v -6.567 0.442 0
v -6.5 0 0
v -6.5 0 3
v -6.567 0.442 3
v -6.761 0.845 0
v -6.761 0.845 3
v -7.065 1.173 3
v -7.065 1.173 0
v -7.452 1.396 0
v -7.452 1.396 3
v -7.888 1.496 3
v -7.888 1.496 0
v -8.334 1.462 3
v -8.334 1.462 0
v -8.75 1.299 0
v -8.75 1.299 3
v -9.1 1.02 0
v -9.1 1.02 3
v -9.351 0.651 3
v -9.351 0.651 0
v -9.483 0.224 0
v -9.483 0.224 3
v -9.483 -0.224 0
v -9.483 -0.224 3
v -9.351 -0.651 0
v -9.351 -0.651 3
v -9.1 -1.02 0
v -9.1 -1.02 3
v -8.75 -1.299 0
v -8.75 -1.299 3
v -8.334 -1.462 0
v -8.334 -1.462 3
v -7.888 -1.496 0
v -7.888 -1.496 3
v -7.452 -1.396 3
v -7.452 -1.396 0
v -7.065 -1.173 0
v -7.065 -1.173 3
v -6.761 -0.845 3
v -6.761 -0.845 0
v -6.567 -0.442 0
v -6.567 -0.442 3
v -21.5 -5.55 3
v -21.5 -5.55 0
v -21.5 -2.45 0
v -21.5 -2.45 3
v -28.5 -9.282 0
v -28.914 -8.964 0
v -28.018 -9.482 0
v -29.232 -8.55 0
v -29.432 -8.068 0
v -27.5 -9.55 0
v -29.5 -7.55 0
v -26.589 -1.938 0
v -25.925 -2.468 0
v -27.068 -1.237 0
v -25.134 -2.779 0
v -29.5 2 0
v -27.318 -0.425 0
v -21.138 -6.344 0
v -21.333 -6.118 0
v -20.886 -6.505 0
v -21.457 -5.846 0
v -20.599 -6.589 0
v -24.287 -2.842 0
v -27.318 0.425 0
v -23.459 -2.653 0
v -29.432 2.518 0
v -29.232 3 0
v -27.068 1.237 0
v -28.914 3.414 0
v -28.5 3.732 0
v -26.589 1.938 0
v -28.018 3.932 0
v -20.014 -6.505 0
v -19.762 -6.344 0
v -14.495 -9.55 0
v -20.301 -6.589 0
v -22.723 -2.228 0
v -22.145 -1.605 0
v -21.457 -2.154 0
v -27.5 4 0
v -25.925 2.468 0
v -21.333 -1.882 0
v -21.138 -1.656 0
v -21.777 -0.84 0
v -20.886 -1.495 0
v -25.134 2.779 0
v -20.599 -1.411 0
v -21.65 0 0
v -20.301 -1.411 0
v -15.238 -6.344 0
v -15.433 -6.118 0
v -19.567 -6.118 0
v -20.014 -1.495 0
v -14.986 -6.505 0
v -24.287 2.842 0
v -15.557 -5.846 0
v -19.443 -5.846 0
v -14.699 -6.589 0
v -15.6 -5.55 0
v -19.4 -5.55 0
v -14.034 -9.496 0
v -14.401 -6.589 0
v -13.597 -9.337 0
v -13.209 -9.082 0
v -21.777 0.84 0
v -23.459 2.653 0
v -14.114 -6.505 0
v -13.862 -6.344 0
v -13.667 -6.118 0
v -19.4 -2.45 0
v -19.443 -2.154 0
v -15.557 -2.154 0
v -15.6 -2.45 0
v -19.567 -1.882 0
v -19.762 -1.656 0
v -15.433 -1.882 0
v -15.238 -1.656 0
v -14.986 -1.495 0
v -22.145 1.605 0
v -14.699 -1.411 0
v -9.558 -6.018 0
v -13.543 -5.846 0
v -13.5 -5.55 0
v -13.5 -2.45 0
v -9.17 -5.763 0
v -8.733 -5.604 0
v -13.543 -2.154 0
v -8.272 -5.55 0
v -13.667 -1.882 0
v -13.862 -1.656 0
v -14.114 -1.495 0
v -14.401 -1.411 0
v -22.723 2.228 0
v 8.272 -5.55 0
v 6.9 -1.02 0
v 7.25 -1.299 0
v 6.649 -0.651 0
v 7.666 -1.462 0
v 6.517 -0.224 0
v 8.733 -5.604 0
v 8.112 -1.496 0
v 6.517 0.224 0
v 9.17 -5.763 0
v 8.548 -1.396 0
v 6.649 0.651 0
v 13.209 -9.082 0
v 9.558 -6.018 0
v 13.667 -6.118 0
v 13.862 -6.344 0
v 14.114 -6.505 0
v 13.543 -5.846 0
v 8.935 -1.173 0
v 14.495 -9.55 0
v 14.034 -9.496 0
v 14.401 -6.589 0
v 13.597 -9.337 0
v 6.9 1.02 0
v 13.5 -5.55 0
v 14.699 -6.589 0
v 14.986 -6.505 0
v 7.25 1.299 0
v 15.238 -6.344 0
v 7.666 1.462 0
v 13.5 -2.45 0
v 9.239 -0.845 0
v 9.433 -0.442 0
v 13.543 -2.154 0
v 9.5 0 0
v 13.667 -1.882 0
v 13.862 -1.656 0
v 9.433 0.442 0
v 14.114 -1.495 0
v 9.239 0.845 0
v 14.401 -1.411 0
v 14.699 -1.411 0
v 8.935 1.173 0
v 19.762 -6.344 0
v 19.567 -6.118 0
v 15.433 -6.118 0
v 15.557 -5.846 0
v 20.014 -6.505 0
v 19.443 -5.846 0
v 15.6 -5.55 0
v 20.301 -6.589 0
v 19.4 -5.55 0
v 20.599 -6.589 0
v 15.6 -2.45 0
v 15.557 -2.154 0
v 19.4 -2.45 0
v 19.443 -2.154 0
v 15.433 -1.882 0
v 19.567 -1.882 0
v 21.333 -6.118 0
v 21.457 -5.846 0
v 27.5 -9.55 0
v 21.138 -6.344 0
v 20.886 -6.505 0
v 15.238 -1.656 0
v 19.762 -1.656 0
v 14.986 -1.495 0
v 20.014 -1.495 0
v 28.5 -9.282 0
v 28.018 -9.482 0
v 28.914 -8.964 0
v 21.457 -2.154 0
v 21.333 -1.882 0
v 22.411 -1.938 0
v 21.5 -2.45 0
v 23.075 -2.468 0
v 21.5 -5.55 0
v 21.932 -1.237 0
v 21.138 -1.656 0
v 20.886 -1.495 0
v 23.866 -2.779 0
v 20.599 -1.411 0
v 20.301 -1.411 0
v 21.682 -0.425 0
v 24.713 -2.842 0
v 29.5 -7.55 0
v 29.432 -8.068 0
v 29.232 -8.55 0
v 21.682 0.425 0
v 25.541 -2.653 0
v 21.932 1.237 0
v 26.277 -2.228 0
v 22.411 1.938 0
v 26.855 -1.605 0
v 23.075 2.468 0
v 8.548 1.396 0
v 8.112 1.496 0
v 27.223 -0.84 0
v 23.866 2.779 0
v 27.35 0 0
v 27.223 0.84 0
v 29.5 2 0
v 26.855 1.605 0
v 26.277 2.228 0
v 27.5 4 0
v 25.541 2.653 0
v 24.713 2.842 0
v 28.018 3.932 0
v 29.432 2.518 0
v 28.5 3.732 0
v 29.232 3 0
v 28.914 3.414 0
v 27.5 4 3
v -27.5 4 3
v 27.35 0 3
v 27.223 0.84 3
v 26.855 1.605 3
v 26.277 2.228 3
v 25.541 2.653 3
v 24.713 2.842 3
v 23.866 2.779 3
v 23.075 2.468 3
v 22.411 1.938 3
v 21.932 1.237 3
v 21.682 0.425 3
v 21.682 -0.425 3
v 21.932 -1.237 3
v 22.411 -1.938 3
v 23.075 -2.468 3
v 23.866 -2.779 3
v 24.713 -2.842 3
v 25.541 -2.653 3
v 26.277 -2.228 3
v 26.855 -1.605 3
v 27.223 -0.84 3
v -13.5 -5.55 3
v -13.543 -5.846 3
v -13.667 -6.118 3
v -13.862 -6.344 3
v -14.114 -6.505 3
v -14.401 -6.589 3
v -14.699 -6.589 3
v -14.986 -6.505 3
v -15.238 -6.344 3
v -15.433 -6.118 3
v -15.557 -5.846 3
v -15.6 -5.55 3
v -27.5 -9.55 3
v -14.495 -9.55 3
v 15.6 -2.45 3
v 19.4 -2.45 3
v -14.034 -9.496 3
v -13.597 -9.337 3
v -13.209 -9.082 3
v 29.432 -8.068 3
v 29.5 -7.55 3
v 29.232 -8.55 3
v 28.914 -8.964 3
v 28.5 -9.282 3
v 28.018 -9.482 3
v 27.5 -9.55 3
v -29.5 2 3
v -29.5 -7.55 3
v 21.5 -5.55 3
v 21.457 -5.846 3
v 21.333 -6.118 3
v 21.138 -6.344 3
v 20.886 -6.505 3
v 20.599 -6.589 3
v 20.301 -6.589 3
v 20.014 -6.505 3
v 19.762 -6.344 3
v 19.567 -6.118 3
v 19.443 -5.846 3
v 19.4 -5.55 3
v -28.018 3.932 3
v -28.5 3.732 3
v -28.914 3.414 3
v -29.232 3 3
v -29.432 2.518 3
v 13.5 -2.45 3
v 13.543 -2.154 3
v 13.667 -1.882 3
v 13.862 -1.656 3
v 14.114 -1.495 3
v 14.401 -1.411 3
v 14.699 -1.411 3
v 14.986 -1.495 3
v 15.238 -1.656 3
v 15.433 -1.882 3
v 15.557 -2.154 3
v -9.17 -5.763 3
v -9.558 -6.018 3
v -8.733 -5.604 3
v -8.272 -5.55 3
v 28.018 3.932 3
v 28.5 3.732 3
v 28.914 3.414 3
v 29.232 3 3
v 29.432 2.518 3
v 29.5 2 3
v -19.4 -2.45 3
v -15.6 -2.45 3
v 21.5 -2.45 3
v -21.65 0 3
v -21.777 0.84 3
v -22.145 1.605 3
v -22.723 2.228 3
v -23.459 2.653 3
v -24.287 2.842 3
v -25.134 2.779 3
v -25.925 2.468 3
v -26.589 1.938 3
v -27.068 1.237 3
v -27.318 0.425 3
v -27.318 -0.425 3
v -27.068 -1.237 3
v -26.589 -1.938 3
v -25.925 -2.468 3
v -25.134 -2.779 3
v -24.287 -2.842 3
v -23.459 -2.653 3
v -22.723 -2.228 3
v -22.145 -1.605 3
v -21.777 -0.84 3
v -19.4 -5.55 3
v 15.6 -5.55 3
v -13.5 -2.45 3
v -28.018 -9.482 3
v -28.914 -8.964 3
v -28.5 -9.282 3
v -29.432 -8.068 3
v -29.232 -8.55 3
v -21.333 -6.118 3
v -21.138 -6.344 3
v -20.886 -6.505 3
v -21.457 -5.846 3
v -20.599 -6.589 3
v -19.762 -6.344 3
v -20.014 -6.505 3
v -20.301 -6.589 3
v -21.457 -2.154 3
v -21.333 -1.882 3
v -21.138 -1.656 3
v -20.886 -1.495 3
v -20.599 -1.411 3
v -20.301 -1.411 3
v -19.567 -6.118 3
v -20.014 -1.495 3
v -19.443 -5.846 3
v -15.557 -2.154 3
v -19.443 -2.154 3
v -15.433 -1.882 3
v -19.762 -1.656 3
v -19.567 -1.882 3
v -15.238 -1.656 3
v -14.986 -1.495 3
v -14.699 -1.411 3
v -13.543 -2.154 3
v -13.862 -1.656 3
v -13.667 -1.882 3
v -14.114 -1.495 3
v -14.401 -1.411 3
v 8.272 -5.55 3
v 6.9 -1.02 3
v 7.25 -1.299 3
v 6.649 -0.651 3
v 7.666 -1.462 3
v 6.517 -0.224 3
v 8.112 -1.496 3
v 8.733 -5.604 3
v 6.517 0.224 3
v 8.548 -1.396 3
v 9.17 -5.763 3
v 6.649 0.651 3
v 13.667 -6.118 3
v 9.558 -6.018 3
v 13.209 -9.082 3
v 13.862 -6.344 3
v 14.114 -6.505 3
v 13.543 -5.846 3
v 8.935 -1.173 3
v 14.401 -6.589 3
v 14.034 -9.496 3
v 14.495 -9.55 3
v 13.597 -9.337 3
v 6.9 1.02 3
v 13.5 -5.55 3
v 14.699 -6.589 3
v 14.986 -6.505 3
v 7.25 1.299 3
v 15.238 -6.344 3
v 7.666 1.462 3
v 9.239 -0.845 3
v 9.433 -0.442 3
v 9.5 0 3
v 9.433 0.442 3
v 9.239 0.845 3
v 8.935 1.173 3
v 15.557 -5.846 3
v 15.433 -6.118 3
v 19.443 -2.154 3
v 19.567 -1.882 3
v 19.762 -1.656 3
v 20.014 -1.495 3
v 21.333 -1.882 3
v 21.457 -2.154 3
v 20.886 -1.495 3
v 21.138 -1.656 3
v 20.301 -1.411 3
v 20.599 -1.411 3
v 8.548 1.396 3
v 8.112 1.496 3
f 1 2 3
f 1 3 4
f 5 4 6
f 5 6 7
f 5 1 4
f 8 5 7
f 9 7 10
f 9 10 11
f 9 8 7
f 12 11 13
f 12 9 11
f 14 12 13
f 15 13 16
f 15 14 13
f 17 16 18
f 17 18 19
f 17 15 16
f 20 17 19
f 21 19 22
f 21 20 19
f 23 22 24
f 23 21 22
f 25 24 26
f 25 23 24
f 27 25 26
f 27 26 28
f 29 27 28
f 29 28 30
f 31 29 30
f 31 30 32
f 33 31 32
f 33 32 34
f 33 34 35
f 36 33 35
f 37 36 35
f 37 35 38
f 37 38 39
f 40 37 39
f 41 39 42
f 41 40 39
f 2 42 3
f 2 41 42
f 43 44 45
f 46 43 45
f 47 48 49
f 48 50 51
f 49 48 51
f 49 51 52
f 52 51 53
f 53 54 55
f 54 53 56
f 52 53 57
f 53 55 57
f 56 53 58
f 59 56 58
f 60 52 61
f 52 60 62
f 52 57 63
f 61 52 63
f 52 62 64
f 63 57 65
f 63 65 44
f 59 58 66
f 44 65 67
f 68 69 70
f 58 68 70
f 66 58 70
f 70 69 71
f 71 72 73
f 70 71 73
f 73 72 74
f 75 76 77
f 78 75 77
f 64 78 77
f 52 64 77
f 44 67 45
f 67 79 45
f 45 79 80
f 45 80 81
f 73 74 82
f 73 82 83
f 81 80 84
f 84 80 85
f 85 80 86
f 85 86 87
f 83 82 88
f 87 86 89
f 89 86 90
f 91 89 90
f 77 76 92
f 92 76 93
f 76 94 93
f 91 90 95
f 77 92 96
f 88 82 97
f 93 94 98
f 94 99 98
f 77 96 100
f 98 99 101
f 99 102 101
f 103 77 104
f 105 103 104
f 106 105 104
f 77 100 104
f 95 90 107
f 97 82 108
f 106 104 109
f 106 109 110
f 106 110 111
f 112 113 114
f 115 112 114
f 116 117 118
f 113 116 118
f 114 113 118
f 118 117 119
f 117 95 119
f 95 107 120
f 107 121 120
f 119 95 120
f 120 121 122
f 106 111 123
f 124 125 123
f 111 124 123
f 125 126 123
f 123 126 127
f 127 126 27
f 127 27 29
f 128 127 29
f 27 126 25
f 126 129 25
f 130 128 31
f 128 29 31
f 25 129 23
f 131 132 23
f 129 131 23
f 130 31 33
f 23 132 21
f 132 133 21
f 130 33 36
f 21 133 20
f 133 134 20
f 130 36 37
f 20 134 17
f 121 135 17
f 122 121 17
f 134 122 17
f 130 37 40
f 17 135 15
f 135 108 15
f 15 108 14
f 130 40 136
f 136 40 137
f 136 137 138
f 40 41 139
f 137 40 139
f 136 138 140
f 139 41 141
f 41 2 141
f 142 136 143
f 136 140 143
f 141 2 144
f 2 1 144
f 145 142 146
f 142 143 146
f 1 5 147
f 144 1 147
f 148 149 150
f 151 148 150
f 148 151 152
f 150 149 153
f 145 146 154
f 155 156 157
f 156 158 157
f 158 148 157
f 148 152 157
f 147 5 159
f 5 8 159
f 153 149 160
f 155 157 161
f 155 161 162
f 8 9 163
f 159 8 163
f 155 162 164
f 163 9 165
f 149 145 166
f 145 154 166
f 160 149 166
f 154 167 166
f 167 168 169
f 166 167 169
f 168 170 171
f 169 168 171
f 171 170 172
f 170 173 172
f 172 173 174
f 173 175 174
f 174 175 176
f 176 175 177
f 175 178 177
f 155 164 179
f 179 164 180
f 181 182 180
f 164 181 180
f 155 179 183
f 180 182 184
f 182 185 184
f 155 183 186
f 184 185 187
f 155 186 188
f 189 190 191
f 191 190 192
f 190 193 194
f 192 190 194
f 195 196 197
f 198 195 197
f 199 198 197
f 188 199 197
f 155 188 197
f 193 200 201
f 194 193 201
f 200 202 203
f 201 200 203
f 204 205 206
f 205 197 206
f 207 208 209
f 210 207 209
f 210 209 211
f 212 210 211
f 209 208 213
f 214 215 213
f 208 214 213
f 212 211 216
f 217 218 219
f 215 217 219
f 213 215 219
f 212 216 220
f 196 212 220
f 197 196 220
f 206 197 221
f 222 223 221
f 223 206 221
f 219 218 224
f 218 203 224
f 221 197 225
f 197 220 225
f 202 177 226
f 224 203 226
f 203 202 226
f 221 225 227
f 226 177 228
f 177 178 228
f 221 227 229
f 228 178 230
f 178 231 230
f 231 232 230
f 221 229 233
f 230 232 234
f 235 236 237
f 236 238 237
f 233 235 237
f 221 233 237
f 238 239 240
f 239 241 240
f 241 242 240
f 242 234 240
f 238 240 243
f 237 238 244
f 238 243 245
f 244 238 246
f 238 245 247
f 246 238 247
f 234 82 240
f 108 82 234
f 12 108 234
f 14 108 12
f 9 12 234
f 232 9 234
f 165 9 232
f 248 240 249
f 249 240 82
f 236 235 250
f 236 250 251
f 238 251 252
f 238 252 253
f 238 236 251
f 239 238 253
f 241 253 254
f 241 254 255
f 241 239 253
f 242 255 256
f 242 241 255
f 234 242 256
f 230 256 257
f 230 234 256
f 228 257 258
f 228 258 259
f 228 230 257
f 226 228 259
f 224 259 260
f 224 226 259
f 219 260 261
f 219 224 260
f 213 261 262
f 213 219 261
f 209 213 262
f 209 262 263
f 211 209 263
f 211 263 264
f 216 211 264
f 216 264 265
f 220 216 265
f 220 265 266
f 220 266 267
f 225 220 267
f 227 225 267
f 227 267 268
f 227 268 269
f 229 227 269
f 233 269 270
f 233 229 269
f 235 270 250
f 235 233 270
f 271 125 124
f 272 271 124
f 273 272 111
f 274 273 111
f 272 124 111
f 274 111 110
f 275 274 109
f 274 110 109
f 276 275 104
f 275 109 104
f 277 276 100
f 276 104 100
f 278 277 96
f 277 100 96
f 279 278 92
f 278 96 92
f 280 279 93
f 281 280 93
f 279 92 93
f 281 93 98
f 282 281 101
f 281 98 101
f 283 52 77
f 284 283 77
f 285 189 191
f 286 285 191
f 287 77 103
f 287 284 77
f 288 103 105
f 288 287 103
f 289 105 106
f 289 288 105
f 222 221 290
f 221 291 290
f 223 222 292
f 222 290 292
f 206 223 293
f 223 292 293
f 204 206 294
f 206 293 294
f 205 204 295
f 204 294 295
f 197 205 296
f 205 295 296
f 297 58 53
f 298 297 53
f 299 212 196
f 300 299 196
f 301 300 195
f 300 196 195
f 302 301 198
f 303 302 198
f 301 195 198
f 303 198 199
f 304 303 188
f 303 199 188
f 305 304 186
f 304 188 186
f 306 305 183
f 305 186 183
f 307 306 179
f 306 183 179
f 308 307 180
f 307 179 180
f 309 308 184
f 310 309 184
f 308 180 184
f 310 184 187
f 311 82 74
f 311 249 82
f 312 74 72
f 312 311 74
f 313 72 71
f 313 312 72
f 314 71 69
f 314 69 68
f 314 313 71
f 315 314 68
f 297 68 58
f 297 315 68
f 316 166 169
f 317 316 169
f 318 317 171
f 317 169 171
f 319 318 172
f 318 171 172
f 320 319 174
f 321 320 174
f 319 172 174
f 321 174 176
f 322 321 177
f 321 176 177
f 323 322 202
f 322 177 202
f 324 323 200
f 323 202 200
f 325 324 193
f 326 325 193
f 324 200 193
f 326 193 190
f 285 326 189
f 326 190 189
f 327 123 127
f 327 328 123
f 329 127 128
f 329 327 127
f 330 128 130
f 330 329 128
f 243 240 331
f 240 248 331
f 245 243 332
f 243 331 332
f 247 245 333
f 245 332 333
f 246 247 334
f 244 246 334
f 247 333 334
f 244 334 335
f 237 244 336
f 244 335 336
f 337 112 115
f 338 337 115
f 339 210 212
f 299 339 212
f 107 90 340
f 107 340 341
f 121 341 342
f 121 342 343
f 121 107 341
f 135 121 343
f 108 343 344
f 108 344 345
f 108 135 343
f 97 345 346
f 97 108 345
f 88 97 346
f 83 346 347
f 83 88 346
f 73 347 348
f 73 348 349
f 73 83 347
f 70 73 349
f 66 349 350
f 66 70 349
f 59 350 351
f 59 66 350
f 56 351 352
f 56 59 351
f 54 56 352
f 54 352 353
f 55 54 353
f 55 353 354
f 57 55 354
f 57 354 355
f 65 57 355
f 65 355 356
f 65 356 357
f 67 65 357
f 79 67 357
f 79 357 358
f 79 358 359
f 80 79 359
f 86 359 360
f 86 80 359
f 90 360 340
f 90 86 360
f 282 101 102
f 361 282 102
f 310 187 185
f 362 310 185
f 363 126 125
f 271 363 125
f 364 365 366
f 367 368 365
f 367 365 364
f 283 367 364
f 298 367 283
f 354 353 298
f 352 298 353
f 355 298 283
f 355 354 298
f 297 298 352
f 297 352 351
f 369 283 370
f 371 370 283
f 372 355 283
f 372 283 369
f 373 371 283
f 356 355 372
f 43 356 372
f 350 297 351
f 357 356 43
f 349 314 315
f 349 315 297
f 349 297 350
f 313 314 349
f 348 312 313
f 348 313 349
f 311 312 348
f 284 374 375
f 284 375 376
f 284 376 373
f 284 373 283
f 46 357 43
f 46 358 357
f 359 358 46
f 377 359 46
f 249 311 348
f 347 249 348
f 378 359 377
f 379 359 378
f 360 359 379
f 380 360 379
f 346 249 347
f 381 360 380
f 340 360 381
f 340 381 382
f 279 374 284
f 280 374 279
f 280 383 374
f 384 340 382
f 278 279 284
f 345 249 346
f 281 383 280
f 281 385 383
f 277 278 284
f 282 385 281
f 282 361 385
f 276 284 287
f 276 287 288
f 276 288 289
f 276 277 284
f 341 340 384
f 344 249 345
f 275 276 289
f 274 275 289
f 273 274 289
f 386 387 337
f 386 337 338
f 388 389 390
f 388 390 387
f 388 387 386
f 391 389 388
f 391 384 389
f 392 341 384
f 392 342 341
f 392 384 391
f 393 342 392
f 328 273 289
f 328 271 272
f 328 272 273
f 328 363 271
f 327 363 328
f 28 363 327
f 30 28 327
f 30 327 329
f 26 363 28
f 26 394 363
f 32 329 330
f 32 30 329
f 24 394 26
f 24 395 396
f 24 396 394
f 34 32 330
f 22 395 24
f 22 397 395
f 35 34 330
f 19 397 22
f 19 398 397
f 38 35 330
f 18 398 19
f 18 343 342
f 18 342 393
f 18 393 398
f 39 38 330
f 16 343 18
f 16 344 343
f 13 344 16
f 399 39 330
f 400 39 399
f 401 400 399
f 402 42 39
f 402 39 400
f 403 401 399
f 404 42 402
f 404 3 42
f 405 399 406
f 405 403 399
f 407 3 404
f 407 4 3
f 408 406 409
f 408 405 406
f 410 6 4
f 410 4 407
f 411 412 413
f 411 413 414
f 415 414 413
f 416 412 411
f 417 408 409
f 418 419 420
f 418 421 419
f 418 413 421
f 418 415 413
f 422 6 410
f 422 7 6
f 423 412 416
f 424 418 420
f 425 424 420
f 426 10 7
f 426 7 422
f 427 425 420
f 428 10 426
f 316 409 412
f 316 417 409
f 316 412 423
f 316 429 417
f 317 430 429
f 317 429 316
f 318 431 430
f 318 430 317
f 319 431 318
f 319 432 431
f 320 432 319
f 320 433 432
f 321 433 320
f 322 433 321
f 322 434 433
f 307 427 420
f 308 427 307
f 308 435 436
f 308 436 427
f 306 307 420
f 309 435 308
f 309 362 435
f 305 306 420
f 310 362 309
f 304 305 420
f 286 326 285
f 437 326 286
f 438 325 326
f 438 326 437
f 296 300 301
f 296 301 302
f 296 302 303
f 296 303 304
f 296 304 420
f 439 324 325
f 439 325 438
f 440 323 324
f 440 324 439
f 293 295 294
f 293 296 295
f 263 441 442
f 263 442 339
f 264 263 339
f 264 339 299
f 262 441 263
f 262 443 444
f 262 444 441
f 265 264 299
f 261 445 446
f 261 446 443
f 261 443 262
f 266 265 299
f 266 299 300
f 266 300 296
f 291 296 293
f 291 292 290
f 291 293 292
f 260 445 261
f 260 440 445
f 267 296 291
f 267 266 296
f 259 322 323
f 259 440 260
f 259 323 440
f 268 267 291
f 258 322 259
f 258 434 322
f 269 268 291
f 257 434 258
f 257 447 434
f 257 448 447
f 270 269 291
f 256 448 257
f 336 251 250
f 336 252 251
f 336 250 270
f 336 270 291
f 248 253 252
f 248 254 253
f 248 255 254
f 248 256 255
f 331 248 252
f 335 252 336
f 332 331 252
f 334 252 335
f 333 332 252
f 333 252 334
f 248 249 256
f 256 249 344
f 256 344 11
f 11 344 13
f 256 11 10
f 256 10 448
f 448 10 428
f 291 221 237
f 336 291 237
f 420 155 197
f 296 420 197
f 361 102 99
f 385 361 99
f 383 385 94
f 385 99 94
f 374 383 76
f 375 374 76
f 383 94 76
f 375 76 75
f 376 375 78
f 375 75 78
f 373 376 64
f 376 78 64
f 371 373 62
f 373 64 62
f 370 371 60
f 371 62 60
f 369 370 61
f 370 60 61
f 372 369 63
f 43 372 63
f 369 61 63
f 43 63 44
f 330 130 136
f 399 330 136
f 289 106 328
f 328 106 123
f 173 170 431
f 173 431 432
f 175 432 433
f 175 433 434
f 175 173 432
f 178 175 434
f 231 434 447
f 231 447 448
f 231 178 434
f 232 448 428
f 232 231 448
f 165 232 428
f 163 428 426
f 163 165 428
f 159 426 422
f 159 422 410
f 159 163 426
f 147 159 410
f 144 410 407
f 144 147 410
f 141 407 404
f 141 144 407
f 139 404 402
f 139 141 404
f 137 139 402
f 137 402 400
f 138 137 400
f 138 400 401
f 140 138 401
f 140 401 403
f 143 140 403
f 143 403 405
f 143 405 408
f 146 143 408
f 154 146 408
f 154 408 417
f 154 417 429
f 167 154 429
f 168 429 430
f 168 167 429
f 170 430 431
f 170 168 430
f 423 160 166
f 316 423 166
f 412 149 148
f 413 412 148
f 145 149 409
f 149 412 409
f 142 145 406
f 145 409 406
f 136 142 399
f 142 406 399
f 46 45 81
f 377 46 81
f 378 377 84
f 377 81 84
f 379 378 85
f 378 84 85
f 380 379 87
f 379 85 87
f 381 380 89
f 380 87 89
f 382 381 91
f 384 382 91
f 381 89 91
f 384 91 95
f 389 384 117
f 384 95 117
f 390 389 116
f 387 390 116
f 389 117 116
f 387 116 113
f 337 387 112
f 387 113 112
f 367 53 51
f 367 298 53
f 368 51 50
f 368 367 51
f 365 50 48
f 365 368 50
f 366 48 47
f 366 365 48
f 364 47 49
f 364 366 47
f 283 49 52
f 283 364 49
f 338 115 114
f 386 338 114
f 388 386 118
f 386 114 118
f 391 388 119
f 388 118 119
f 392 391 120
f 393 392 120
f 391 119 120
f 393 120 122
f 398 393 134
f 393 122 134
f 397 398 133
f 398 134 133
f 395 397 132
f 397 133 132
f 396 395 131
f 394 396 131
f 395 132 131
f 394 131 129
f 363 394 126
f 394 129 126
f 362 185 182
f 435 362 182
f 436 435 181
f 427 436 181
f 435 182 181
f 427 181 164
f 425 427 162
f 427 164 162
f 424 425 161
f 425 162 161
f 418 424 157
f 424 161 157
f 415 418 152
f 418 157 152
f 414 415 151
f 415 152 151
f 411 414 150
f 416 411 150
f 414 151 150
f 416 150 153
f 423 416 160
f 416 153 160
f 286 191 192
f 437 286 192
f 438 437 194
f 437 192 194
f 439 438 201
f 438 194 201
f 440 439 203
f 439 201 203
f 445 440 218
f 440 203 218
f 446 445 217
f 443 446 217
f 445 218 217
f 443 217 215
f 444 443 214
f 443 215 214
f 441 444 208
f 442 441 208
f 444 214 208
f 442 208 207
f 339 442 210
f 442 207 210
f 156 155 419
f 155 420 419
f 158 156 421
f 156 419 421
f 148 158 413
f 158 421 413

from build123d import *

# Parameters (mm, degrees)
SKETCH_1_R      = 2.85
SKETCH_1_R_2    = 1.5
EXTRUDE_1_DEPTH = 3
FILLET_1_R      = 2


with BuildPart() as part:
    # 草图1 → 凸台-拉伸1 (new body)
    with BuildSketch(Plane.XY):
        Polygon((29.5, 4), (-29.5, 4), (-29.5, -9.55), (-13.76701437, -9.55), (-9, -5.55), (9, -5.55), (13.76701437, -9.55), (29.5, -9.55), align=None)
        with BuildLine():
            Line((-15.6, -5.55), (-19.4, -5.55))
            ThreePointArc((-19.4, -5.55), (-20.45, -6.6), (-21.5, -5.55))
            Line((-21.5, -5.55), (-21.5, -2.45))
            ThreePointArc((-21.5, -2.45), (-20.45, -1.4), (-19.4, -2.45))
            Line((-19.4, -2.45), (-15.6, -2.45))
            ThreePointArc((-15.6, -2.45), (-14.55, -1.4), (-13.5, -2.45))
            Line((-13.5, -2.45), (-13.5, -5.55))
            ThreePointArc((-13.5, -5.55), (-14.55, -6.6), (-15.6, -5.55))
        make_face(mode=Mode.SUBTRACT)
        with BuildLine():
            Line((13.5, -5.55), (13.5, -2.45))
            ThreePointArc((13.5, -2.45), (14.55, -1.4), (15.6, -2.45))
            Line((15.6, -2.45), (19.4, -2.45))
            ThreePointArc((19.4, -2.45), (20.45, -1.4), (21.5, -2.45))
            Line((21.5, -2.45), (21.5, -5.55))
            ThreePointArc((21.5, -5.55), (20.45, -6.6), (19.4, -5.55))
            Line((19.4, -5.55), (15.6, -5.55))
            ThreePointArc((15.6, -5.55), (14.55, -6.6), (13.5, -5.55))
        make_face(mode=Mode.SUBTRACT)
        with Locations((-24.5, 0)):
            Circle(SKETCH_1_R, mode=Mode.SUBTRACT)
        with Locations((-8, 0)):
            Circle(SKETCH_1_R_2, mode=Mode.SUBTRACT)
        with Locations((8, 0)):
            Circle(SKETCH_1_R_2, mode=Mode.SUBTRACT)
        with Locations((24.5, 0)):
            Circle(SKETCH_1_R, mode=Mode.SUBTRACT)
    extrude(amount=EXTRUDE_1_DEPTH)

    # 圆角1
    fillet_1_edges = [part.edges().sort_by_distance(p)[0] for p in [
        (9, -5.55, 1.5),
        (-9, -5.55, 1.5),
        (-13.76701437, -9.55, 1.5),
        (-29.5, -9.55, 1.5),
        (-29.5, 4, 1.5),
        (29.5, 4, 1.5),
        (29.5, -9.55, 1.5),
        (13.76701437, -9.55, 1.5),
    ]]
    fillet(fillet_1_edges, radius=FILLET_1_R)


solid = part.part
